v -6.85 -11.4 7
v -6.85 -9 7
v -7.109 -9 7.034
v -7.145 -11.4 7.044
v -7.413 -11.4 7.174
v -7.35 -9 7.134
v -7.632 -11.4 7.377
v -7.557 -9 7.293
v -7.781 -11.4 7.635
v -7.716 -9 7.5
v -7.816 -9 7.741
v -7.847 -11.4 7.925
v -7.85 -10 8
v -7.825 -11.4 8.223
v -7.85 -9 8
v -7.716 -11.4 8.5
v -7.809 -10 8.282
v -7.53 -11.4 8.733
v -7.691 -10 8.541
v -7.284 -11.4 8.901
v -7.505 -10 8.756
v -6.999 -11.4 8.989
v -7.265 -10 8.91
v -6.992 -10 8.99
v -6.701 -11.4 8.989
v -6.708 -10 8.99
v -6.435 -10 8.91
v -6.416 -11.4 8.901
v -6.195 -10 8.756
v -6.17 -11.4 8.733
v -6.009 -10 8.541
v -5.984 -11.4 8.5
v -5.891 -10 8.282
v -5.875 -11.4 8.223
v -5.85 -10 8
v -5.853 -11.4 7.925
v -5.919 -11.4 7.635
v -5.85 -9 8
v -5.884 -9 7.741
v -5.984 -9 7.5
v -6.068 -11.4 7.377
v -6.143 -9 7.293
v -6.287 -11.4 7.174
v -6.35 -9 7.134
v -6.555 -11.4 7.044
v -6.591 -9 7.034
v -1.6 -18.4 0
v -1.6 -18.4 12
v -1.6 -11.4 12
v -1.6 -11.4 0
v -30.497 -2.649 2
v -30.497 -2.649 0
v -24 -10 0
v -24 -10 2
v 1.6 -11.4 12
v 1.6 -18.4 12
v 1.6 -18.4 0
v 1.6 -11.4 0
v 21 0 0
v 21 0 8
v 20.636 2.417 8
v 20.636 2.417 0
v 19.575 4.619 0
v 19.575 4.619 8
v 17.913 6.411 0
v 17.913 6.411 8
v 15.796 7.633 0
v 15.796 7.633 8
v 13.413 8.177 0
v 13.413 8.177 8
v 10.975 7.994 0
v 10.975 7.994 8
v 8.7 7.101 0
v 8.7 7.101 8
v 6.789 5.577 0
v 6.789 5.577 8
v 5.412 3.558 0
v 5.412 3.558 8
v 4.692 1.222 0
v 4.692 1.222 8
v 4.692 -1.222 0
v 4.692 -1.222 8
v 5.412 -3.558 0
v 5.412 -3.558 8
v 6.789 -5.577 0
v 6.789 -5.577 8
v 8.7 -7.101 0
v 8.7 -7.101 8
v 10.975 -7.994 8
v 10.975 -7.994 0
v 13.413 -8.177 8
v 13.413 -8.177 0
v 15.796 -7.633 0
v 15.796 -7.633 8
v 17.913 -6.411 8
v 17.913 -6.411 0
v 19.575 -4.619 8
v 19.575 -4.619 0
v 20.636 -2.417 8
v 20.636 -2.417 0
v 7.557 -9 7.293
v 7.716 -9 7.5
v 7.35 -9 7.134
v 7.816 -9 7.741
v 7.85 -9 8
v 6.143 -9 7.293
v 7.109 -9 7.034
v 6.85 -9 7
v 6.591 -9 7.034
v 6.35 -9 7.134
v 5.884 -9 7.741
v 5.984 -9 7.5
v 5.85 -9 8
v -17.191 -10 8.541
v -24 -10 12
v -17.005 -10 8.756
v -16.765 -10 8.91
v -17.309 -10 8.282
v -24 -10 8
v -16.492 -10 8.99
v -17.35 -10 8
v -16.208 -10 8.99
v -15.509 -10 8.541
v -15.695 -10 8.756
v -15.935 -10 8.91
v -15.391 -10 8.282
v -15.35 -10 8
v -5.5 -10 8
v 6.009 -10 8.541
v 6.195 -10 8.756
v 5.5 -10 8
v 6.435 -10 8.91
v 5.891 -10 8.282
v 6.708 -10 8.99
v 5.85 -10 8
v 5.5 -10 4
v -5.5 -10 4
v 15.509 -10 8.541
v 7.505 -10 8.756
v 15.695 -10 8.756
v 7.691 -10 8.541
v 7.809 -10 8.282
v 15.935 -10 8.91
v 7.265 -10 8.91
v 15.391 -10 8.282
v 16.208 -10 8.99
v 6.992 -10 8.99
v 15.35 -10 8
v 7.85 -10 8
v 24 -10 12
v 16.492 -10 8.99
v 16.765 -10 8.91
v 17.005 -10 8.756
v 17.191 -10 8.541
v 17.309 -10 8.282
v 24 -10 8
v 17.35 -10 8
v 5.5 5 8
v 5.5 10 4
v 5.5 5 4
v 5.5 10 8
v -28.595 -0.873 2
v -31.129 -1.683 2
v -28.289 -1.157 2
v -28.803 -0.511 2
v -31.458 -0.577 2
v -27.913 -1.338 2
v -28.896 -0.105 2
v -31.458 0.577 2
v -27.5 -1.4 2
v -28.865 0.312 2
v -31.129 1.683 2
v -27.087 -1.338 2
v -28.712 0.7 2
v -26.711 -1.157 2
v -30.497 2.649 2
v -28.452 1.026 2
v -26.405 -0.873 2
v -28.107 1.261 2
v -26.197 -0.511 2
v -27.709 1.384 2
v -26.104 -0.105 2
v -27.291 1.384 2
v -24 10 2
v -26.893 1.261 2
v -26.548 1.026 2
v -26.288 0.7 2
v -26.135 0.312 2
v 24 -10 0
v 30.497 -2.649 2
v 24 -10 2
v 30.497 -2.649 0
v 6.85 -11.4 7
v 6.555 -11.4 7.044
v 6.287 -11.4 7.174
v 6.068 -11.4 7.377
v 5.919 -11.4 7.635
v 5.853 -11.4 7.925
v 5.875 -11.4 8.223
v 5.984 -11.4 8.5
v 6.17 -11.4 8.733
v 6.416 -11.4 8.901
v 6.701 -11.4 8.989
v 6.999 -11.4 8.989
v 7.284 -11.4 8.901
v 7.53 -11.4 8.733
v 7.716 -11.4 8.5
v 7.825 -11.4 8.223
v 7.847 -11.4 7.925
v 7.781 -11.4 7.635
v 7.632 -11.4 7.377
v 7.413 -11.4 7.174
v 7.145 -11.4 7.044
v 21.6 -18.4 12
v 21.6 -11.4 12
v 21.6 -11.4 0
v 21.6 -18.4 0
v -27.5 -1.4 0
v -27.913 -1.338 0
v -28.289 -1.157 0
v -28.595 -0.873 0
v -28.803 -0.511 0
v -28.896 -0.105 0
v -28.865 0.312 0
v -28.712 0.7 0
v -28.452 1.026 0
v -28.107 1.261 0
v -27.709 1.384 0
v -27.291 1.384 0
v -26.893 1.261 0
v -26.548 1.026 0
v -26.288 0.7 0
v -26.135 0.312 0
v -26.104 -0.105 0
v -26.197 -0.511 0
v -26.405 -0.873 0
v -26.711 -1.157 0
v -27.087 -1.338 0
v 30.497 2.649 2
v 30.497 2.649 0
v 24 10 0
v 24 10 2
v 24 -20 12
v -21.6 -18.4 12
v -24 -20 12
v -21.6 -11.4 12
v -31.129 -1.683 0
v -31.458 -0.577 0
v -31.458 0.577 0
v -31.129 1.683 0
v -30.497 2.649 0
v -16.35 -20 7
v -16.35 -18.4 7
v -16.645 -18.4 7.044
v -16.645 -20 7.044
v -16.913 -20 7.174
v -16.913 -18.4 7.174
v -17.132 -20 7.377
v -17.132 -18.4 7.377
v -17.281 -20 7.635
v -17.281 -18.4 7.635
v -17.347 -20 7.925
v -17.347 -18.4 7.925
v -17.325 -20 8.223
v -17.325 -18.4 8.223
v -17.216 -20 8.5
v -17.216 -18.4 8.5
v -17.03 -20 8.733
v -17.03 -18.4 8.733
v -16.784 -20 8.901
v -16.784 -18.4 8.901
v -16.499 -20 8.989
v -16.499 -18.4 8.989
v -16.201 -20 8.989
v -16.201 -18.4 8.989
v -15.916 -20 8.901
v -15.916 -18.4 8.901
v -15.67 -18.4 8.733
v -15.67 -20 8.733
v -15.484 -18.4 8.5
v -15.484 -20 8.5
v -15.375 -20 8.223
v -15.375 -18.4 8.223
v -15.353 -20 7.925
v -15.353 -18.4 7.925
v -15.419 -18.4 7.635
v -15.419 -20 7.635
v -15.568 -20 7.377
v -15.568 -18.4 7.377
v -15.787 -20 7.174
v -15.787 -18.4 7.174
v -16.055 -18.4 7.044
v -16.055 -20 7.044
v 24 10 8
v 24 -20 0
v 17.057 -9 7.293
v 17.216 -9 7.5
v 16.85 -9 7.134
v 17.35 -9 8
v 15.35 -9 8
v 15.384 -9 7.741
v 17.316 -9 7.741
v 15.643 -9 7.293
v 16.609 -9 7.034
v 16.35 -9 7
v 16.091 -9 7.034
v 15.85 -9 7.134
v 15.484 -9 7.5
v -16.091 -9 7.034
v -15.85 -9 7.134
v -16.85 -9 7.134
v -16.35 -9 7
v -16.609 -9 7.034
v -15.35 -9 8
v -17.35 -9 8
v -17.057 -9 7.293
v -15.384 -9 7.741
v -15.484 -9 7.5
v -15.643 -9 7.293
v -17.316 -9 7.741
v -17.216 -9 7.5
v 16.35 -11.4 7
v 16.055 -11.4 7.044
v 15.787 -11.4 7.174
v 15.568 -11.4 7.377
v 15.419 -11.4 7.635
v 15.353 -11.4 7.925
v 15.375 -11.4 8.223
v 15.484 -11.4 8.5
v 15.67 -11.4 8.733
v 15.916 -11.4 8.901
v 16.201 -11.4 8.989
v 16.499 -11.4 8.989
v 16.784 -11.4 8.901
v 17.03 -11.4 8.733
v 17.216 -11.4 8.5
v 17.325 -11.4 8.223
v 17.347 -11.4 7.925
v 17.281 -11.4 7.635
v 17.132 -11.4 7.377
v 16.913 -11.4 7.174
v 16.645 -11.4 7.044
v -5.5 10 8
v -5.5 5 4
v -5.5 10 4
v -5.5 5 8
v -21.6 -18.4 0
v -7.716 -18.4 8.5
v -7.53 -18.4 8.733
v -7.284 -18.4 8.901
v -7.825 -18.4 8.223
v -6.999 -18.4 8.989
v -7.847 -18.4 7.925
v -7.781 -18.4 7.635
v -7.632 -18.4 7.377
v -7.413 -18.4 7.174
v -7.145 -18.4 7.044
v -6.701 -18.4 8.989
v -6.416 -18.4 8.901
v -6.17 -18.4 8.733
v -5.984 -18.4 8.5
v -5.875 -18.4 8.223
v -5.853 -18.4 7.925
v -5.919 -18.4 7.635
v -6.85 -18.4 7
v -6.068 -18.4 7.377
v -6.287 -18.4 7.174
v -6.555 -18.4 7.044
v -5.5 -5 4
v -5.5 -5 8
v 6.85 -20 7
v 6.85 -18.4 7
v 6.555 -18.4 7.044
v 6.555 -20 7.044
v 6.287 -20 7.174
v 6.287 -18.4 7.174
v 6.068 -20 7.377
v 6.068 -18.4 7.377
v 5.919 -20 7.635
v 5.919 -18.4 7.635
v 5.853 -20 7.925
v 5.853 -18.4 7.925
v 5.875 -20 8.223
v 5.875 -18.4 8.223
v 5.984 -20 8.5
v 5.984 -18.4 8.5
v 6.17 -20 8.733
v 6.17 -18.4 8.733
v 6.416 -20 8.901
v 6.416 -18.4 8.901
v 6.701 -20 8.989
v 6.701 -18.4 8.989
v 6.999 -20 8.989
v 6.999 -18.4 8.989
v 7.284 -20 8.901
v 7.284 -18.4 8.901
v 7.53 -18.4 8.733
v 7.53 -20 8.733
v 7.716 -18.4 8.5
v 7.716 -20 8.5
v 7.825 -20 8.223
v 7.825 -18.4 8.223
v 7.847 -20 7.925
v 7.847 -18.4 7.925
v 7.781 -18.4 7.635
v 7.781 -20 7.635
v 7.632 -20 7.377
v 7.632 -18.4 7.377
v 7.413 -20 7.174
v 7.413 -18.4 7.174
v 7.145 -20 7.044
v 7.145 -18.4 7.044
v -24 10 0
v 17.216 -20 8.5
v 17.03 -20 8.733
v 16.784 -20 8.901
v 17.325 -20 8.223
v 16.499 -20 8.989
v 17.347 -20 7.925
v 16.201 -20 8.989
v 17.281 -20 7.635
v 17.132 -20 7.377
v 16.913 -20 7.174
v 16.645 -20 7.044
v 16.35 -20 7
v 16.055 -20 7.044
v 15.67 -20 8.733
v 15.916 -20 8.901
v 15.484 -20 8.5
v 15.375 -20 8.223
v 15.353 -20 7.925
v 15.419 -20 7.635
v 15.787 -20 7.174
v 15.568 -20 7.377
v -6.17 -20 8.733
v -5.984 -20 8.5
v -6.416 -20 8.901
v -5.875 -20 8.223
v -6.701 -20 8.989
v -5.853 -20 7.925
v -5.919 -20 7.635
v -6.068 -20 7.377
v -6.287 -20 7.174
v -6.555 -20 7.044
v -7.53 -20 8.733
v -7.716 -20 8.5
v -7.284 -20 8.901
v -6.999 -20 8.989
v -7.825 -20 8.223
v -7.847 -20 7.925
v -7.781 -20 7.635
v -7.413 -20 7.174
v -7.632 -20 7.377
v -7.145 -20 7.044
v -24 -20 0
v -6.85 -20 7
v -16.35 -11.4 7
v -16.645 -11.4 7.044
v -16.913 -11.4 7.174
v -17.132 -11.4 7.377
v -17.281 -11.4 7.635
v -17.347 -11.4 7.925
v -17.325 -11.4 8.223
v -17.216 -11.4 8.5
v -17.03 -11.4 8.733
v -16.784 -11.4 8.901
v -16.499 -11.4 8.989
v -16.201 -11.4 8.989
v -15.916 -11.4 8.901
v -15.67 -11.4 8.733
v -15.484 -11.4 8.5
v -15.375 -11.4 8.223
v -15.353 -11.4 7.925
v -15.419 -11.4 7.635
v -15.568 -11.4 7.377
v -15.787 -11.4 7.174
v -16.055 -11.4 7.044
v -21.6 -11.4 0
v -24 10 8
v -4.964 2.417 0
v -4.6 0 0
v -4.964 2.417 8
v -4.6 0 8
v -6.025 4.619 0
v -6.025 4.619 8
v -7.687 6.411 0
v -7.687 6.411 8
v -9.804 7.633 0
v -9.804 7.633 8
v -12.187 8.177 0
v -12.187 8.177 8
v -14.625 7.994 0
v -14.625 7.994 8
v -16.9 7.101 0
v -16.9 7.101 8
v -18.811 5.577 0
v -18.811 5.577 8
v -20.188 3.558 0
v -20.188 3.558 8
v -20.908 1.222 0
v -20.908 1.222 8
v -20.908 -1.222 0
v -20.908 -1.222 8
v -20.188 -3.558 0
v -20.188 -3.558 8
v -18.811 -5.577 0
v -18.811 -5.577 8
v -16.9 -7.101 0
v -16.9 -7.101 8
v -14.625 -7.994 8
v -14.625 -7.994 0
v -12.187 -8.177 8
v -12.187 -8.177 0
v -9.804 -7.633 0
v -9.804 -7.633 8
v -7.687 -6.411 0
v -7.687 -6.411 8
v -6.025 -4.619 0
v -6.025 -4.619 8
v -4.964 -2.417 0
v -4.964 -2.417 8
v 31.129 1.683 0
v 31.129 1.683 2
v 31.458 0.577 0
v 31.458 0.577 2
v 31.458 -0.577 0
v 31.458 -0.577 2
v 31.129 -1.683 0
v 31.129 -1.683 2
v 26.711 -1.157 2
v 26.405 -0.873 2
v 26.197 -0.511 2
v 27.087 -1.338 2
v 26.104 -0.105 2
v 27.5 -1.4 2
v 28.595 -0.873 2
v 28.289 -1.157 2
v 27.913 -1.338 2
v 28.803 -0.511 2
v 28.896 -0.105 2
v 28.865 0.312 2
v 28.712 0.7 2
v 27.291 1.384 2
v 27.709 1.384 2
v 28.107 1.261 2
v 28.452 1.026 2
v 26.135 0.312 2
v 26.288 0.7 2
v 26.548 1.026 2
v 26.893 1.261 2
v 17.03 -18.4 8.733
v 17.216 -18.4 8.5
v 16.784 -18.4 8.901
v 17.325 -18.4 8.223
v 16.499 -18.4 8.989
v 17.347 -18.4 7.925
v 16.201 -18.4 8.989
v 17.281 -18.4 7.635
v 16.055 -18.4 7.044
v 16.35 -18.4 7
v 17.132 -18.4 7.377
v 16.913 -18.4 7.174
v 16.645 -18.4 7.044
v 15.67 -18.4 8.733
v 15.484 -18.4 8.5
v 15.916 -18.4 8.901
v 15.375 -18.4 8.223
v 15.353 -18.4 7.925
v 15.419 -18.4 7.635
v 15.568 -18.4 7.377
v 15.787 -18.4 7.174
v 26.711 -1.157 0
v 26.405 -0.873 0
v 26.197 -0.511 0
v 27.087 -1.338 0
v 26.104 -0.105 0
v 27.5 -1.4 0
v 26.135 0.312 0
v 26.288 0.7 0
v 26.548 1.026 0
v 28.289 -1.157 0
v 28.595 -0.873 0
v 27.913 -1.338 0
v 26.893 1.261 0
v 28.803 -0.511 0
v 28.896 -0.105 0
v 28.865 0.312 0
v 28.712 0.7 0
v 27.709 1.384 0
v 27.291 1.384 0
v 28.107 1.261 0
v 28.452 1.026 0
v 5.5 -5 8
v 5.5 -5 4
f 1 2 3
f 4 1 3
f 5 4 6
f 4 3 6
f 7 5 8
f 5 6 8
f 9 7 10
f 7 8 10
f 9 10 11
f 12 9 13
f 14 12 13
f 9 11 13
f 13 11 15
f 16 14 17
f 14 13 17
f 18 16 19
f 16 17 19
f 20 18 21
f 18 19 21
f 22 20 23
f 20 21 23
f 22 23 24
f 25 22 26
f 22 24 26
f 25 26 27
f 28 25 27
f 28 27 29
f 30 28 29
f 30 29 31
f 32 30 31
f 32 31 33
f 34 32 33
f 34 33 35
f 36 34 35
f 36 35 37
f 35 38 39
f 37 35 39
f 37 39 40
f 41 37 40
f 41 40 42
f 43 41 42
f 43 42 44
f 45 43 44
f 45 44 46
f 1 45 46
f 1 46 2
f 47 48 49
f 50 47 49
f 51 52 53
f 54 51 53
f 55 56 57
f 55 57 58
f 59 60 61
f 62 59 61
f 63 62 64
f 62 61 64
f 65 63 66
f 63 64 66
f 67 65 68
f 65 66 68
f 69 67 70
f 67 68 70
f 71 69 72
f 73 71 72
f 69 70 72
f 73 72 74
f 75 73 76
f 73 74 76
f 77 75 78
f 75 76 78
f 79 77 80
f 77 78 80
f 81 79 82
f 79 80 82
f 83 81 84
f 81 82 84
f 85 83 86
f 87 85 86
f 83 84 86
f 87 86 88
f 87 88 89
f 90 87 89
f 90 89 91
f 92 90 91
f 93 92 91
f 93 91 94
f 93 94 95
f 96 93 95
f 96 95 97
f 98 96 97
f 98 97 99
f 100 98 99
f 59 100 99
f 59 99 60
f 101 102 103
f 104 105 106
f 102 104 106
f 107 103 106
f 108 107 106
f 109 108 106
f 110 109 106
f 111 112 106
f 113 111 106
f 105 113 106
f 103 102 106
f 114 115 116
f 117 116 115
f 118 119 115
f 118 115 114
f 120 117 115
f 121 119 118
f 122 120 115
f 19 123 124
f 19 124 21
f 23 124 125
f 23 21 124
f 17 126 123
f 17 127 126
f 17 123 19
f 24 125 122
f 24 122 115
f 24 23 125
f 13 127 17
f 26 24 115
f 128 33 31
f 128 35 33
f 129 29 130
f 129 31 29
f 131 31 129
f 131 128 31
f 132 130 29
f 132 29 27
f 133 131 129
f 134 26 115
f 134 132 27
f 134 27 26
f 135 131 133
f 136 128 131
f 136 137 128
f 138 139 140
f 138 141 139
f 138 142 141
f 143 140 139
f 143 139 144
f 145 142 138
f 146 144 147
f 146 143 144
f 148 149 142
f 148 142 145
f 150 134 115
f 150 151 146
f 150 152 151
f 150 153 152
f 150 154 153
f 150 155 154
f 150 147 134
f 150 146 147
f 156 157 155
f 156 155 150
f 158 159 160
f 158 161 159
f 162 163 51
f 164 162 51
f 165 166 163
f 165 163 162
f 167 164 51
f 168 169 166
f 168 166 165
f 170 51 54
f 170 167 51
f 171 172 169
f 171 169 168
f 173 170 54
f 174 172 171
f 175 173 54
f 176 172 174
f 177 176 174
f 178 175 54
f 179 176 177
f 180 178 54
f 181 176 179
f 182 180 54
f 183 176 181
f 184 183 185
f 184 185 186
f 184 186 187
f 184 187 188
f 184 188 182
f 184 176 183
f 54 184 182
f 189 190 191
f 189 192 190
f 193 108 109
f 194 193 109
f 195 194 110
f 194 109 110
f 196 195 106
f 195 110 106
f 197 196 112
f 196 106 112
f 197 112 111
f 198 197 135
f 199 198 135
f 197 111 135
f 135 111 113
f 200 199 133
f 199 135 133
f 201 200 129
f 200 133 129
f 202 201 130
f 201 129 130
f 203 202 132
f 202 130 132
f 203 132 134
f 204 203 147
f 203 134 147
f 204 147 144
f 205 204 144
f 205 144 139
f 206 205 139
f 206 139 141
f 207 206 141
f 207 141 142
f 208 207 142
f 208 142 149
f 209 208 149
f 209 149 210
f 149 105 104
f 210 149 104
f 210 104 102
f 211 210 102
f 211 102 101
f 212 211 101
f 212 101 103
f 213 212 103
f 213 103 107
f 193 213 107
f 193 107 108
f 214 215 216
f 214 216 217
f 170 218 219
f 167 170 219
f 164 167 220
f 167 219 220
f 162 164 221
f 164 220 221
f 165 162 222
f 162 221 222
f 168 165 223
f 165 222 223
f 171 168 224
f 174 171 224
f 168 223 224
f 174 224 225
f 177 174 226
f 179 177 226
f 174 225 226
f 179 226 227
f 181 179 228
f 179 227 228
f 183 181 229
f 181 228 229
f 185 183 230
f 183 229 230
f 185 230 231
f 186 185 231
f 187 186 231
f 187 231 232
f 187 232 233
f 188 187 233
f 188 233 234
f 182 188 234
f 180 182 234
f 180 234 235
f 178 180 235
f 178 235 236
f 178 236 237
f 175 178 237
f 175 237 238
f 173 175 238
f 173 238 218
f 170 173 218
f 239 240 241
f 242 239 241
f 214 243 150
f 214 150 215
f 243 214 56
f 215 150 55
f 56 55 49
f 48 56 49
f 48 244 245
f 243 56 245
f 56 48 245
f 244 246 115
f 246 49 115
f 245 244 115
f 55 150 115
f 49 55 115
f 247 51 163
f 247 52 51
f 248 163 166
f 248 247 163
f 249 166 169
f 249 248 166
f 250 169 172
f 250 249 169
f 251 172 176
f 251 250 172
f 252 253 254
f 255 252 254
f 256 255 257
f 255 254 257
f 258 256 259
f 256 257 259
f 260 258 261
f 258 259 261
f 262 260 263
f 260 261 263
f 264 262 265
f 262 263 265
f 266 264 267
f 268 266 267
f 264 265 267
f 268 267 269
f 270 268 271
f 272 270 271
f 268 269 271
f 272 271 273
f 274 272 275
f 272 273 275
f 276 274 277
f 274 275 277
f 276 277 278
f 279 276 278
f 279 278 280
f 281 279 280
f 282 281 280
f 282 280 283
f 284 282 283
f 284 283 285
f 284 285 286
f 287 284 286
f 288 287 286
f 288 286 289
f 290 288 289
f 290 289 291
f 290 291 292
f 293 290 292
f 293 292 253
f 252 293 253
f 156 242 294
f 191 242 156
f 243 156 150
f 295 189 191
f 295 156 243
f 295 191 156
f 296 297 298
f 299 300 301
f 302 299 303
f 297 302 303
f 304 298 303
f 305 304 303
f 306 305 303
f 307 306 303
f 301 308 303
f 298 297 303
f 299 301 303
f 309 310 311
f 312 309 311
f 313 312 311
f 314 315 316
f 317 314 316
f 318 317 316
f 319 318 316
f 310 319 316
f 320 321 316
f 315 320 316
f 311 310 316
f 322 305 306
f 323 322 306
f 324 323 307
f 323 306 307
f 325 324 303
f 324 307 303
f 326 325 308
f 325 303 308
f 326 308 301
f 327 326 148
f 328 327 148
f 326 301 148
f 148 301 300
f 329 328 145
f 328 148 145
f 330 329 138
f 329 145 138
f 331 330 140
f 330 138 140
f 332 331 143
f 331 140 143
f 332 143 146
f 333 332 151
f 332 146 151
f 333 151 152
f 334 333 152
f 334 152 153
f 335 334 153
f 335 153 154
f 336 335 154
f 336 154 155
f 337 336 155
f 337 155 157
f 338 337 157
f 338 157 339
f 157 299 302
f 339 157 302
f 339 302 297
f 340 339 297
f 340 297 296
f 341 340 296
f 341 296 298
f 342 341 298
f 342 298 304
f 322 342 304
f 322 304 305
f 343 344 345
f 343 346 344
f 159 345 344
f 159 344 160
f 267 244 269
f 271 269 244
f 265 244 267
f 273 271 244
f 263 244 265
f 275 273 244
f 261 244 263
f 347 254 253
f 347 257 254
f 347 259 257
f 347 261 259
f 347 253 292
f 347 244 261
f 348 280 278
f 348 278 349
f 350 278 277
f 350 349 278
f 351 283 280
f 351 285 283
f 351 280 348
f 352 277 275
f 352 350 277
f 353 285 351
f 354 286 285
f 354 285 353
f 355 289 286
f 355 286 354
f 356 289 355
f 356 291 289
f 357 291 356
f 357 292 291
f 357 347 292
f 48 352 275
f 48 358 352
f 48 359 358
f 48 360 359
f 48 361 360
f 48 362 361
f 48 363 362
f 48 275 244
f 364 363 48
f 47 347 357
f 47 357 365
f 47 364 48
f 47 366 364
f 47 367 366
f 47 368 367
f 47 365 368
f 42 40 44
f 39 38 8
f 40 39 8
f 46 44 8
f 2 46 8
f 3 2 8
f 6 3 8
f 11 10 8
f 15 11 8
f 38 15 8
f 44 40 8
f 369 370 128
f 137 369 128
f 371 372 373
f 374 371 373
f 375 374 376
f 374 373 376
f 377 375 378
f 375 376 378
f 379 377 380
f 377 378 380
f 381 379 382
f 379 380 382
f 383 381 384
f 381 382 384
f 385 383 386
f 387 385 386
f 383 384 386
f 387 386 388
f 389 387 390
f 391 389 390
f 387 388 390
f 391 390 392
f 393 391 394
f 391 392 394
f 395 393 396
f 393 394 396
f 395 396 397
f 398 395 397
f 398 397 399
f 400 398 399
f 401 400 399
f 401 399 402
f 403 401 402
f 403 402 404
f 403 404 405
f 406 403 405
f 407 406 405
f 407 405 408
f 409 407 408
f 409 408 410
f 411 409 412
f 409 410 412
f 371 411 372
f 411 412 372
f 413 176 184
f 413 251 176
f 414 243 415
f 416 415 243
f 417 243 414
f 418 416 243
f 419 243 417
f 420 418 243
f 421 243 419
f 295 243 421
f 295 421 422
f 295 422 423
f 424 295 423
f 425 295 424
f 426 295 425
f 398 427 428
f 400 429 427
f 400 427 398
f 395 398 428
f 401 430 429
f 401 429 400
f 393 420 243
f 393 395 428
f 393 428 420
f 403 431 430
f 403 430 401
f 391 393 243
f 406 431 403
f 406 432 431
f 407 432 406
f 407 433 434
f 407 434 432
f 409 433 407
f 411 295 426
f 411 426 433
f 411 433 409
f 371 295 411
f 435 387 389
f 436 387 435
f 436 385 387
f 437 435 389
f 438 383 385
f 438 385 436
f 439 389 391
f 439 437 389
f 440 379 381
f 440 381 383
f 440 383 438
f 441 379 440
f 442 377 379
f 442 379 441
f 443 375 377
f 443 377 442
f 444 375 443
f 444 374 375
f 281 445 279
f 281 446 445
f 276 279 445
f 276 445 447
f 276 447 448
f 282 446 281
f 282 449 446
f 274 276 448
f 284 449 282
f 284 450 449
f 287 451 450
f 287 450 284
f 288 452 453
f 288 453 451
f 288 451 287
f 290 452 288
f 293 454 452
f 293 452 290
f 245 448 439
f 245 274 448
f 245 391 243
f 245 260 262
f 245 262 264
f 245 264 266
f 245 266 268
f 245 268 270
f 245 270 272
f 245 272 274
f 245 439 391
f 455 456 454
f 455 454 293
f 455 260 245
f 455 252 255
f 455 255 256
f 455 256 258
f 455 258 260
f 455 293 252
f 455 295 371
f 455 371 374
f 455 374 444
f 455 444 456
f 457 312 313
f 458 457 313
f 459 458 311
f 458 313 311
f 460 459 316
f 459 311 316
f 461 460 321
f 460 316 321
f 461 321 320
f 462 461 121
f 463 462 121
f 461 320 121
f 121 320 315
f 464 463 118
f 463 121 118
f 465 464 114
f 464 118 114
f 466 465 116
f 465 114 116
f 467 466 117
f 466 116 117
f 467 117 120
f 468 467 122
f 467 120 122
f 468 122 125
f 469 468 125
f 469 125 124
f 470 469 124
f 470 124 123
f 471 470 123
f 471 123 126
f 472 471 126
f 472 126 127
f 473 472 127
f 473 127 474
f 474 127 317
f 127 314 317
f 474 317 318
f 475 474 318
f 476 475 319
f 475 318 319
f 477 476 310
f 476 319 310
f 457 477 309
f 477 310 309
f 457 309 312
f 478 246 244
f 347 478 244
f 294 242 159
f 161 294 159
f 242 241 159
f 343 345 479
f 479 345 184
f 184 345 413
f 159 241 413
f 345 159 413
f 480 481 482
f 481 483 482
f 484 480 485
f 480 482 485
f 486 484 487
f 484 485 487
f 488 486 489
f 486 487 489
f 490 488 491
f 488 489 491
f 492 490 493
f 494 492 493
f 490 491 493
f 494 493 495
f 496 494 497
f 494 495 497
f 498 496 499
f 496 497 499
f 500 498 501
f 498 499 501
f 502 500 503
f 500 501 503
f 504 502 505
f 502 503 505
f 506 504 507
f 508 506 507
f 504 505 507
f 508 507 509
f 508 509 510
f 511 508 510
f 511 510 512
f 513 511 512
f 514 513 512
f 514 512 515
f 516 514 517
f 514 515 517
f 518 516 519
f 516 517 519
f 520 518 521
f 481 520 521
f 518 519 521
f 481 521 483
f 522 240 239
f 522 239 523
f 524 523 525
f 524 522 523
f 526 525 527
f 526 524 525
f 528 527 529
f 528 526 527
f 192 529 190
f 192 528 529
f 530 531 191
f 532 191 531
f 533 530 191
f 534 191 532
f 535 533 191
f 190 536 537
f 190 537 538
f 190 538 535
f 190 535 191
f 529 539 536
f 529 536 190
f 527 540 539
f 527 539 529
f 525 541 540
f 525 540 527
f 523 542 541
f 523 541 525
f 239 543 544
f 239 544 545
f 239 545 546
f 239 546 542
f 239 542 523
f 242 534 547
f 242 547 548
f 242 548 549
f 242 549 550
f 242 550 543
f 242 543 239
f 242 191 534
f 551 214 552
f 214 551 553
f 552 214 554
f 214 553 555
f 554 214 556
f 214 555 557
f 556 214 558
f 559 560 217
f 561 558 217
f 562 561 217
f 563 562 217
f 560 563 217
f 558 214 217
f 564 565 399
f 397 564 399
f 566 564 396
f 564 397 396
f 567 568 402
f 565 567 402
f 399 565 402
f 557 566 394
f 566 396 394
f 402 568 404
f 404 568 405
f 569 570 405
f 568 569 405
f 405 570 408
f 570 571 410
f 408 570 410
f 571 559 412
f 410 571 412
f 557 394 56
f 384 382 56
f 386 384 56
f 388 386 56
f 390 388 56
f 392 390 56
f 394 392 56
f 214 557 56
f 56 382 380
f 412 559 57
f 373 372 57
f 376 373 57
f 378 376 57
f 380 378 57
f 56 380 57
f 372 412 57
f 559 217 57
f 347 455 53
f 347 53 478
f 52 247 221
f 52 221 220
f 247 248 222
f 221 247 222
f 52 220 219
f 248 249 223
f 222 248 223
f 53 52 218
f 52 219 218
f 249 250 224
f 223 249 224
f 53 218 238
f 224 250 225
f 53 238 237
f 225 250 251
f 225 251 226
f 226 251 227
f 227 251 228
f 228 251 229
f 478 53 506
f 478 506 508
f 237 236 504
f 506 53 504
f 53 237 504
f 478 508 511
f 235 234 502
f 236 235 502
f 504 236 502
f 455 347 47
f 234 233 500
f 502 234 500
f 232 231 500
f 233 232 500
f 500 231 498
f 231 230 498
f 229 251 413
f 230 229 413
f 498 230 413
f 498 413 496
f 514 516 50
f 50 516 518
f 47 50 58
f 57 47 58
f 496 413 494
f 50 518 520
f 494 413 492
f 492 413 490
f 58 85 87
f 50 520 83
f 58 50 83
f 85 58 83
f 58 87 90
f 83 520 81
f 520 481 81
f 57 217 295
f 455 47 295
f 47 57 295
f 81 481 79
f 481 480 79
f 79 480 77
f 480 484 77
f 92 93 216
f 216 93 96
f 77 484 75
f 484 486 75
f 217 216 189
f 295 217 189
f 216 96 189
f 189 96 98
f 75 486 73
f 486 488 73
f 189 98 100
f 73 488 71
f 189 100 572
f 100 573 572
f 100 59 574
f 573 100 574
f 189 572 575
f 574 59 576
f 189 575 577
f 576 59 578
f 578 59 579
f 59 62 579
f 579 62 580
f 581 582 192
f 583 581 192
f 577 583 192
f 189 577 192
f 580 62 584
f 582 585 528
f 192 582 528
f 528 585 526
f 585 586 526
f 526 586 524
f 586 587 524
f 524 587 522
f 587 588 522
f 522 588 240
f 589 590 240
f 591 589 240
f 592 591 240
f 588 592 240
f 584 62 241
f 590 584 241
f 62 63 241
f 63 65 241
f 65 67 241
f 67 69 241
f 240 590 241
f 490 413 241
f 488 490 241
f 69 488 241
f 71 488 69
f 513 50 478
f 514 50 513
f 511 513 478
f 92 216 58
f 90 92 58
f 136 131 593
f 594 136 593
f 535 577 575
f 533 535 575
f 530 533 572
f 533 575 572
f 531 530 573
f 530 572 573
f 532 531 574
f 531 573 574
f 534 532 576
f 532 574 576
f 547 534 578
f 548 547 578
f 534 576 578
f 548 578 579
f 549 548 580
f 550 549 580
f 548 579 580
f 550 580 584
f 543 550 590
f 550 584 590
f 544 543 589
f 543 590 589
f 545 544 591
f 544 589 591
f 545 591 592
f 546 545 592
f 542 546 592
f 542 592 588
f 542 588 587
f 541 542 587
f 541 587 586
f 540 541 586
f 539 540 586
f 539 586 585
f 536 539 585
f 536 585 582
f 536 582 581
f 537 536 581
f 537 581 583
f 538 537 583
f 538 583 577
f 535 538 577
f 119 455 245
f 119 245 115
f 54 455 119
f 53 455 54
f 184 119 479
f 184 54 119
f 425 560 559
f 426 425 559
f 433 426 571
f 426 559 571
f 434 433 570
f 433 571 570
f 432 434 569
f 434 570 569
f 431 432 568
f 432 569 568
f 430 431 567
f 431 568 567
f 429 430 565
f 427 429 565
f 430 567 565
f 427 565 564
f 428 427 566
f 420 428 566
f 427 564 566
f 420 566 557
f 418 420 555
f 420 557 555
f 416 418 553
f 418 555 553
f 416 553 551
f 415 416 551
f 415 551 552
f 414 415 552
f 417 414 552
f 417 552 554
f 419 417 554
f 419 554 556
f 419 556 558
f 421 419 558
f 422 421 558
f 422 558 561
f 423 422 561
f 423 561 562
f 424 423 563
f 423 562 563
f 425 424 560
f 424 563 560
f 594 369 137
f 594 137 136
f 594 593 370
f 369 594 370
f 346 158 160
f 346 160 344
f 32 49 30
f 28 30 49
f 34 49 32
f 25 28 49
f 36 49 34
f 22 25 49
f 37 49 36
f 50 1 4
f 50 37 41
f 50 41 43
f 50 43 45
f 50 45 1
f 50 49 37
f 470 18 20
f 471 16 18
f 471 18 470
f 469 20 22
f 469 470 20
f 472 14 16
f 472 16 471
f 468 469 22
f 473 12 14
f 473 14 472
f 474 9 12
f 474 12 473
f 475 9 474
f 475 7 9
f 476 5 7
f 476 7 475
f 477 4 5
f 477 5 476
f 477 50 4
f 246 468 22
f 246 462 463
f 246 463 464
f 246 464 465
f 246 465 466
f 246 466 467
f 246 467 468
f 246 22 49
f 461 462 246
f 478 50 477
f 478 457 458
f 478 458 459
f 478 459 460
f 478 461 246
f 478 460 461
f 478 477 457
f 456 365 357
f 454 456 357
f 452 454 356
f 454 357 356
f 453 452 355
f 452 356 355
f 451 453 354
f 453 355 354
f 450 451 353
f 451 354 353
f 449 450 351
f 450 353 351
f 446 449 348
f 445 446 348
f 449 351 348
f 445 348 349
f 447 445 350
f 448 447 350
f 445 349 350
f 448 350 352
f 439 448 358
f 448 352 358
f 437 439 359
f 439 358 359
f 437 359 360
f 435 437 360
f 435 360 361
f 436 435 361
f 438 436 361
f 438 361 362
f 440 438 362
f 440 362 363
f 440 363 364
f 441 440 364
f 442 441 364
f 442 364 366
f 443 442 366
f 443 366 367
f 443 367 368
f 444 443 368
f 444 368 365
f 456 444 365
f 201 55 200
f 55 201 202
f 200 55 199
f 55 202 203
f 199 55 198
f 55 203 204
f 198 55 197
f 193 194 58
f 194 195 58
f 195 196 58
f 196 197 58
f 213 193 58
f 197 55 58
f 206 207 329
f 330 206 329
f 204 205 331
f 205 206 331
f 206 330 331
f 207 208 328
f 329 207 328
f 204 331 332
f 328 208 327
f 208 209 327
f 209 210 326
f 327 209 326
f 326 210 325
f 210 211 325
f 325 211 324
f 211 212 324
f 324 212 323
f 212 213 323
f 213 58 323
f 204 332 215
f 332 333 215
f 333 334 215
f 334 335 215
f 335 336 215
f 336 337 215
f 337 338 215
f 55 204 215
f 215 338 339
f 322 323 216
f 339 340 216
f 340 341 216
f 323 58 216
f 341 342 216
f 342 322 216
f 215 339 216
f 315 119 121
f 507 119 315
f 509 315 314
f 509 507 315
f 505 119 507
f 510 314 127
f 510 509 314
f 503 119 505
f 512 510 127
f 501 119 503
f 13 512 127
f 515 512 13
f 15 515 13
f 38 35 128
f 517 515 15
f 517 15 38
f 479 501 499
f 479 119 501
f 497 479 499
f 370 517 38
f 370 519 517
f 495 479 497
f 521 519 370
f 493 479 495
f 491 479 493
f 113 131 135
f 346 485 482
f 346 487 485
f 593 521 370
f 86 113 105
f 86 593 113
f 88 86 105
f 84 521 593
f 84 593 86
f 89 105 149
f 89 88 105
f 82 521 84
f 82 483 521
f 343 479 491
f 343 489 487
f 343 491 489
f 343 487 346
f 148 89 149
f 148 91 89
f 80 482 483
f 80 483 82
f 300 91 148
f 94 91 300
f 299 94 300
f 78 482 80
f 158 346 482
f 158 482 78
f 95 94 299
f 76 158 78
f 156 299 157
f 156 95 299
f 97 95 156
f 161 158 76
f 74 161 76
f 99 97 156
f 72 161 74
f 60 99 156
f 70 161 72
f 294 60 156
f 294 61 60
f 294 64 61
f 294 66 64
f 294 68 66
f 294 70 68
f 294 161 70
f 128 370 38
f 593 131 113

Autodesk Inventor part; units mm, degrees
ref_plane "YZ Plane" through (0, 0, 0) normal (1, 0, 0) x (0, 1, 0)
ref_plane "XZ Plane" through (0, 0, 0) normal (0, 1, 0) x (-1, 0, 0)
ref_plane "XY Plane" through (0, 0, 0) normal (0, 0, 1) x (1, 0, 0)
sketch "Эскиз1" plane through (0, 0, 0) normal (0, 0, 1) x (1, 0, 0)
  line L0 (-24, 10) -> (24, 10)
  line L1 (24, 10) -> (24, -10) construction
  line L2 (24, -10) -> (-24, -10)
  line L3 (-24, -10) -> (-24, 10) construction
  line L4 (0, 10) -> (0, -10)
  arc A0 (-30.4971, 2.649) -> (-30.4971, -2.649) centre (-27.5, 0) ccw
  line L5 (-30.4971, 2.649) -> (-24, 10)
  line L6 (-30.4971, -2.649) -> (-24, -10)
  arc A1 (30.4971, -2.649) -> (30.4971, 2.649) centre (27.5, 0) ccw
  line L7 (30.4971, 2.649) -> (24, 10)
  line L8 (30.4971, -2.649) -> (24, -10)
  point P0 (0, 0)
  point P1 (0, 0)
  dimension "d0" = 20
  dimension "d1" = 48
  dimension "d2" = 4
  dimension "d3" = 55
extrude "Выдавливание1" add sketch "Эскиз1" along normal blind 2
sketch "Эскиз2" plane through (0, 0, 2) normal (0, 0, 1) x (1, 0, 0)
  line L0 (24, 10) -> (-24, 10) projected
  line L1 (24, -10) -> (30.4971, -2.649) projected
  line L2 (-24, 10) -> (24, 10)
  line L3 (24, 10) -> (24, -10)
  line L4 (24, -10) -> (-24, -10)
  line L5 (-24, -10) -> (-24, 10)
  point P0 (0, 0)
extrude "Выдавливание2" add sketch "Эскиз2" along normal blind 6
sketch "Эскиз3" plane through (0, 0, 8) normal (0, 0, 1) x (1, 0, 0)
  circle A0 centre (-12.8, 0) radius 8.2
  circle A1 centre (12.8, 0) radius 8.2
  line L0 (-24, -10) -> (24, -10) projected
  line L1 (0, -10) -> (0, 10)
  line L2 (24, 10) -> (-24, 10) projected
  point P0 (0, 0)
  dimension "d8" = 25.6
  dimension "d9" = 16.4
extrude "Выдавливание3" cut sketch "Эскиз3" against normal through all
sketch "Эскиз4" plane through (0, 0, 8) normal (0, 0, 1) x (1, 0, 0)
  line L0 (24, 10) -> (-24, 10) projected
  line L1 (-5.5, 10) -> (5.5, 10)
  line L2 (5.5, 10) -> (5.5, 5)
  line L3 (5.5, 5) -> (-5.5, 5)
  line L4 (-5.5, 5) -> (-5.5, 10)
  line L5 (-24, 10) -> (-24, -10) construction
  line L6 (-24, 0) -> (24, 0)
  line L7 (24, -10) -> (24, 10) construction
  line L8 (-5.5, -10) -> (5.5, -10)
  line L9 (5.5, -10) -> (5.5, -5)
  line L10 (5.5, -5) -> (-5.5, -5)
  line L11 (-5.5, -5) -> (-5.5, -10)
  point P0 (0, 0)
  point P1 (0, 0)
  point P2 (0, 5)
  point P3 (0, -5)
  dimension "d12" = 5
  dimension "d13" = 11
extrude "Выдавливание4" cut sketch "Эскиз4" against normal blind 4
sketch "Эскиз5" plane through (0, 0, 2) normal (0, 0, 1) x (1, 0, 0)
  arc A0 (-30.4971, 2.649) -> (-30.4971, -2.649) centre (-27.5, 0) ccw projected
  arc A1 (30.4971, -2.649) -> (30.4971, 2.649) centre (27.5, 0) ccw projected
  point P0 (0, 0)
  point P1 (27.5, 0)
hole "Отверстие1" at (-27.5, 0, 2) at (27.5, 0, 2) direction (0, 0, -1) diameter 2.8 end through all
sketch "Эскиз6" plane through (0, 0, 0) normal (0, 0, -1) x (-1, 0, 0)
  line L0 (24, -10) -> (-24, -10) projected
  line L1 (24, -10) -> (-24, -10)
  line L2 (-24, -10) -> (-24, -20)
  line L3 (-24, -20) -> (24, -20)
  line L4 (24, -20) -> (24, -10)
  line L5 (-5.5, -10) -> (5.5, -10) projected
  line L6 (0, -20) -> (0, -10)
  line L7 (21.6, -18.4) -> (1.6, -18.4)
  line L8 (1.6, -18.4) -> (1.6, -11.4)
  line L9 (1.6, -11.4) -> (21.6, -11.4)
  line L10 (21.6, -11.4) -> (21.6, -18.4)
  line L11 (-1.6, -11.4) -> (-21.6, -11.4)
  line L12 (-21.6, -11.4) -> (-21.6, -18.4)
  line L13 (-21.6, -18.4) -> (-1.6, -18.4)
  line L14 (-1.6, -18.4) -> (-1.6, -11.4)
  point P0 (0, 0)
  point P1 (0, -10)
  dimension "d25" = 10
  dimension "d26" = 48
  dimension "d41" = 20
  dimension "d42" = 7
  dimension "d43" = 1.6
  dimension "d44" = 3.2
extrude "Выдавливание5" add sketch "Эскиз6" against normal blind 12
sketch "Эскиз7" plane through (-24, -20, 0) normal (0, -1, 0) x (1, 0, 0)
  line L0 (24, 0) -> (24, 12)
  line L1 (48, 0) -> (0, 0) projected
  line L2 (48, 0) -> (0, 0) projected
  line L3 (48, 0) -> (48, 12) projected
  line L4 (0, 12) -> (48, 12) projected
  line L5 (0, 0) -> (0, 12) projected
  line L6 (45.6, 0) -> (25.6, 0) projected
  line L7 (45.6, 0) -> (45.6, 12) projected
  line L8 (25.6, 12) -> (45.6, 12) projected
  line L9 (25.6, 0) -> (25.6, 12) projected
  line L10 (22.4, 0) -> (2.4, 0) projected
  line L11 (22.4, 0) -> (22.4, 12) projected
  line L12 (2.4, 12) -> (22.4, 12) projected
  line L13 (2.4, 0) -> (2.4, 12) projected
  line L14 (0, 12) -> (48, 12) projected
  line L15 (12.4, 12) -> (12.4, 0)
  line L16 (45, 0) -> (28.6, 0) projected
  line L17 (35.6, 0) -> (35.6, 12)
  point P0 (7.65, 8)
  point P1 (17.15, 8)
  point P2 (30.85, 8)
  point P3 (40.35, 8)
  dimension "d46" = 9.5
  dimension "d47" = 8
hole "Отверстие2" at (-16.35, -20, 8) at (-6.85, -20, 8) at (6.85, -20, 8) at (16.35, -20, 8) direction (0, 1, 0) diameter 2 depth 11
properties part number "FrontSensor"
